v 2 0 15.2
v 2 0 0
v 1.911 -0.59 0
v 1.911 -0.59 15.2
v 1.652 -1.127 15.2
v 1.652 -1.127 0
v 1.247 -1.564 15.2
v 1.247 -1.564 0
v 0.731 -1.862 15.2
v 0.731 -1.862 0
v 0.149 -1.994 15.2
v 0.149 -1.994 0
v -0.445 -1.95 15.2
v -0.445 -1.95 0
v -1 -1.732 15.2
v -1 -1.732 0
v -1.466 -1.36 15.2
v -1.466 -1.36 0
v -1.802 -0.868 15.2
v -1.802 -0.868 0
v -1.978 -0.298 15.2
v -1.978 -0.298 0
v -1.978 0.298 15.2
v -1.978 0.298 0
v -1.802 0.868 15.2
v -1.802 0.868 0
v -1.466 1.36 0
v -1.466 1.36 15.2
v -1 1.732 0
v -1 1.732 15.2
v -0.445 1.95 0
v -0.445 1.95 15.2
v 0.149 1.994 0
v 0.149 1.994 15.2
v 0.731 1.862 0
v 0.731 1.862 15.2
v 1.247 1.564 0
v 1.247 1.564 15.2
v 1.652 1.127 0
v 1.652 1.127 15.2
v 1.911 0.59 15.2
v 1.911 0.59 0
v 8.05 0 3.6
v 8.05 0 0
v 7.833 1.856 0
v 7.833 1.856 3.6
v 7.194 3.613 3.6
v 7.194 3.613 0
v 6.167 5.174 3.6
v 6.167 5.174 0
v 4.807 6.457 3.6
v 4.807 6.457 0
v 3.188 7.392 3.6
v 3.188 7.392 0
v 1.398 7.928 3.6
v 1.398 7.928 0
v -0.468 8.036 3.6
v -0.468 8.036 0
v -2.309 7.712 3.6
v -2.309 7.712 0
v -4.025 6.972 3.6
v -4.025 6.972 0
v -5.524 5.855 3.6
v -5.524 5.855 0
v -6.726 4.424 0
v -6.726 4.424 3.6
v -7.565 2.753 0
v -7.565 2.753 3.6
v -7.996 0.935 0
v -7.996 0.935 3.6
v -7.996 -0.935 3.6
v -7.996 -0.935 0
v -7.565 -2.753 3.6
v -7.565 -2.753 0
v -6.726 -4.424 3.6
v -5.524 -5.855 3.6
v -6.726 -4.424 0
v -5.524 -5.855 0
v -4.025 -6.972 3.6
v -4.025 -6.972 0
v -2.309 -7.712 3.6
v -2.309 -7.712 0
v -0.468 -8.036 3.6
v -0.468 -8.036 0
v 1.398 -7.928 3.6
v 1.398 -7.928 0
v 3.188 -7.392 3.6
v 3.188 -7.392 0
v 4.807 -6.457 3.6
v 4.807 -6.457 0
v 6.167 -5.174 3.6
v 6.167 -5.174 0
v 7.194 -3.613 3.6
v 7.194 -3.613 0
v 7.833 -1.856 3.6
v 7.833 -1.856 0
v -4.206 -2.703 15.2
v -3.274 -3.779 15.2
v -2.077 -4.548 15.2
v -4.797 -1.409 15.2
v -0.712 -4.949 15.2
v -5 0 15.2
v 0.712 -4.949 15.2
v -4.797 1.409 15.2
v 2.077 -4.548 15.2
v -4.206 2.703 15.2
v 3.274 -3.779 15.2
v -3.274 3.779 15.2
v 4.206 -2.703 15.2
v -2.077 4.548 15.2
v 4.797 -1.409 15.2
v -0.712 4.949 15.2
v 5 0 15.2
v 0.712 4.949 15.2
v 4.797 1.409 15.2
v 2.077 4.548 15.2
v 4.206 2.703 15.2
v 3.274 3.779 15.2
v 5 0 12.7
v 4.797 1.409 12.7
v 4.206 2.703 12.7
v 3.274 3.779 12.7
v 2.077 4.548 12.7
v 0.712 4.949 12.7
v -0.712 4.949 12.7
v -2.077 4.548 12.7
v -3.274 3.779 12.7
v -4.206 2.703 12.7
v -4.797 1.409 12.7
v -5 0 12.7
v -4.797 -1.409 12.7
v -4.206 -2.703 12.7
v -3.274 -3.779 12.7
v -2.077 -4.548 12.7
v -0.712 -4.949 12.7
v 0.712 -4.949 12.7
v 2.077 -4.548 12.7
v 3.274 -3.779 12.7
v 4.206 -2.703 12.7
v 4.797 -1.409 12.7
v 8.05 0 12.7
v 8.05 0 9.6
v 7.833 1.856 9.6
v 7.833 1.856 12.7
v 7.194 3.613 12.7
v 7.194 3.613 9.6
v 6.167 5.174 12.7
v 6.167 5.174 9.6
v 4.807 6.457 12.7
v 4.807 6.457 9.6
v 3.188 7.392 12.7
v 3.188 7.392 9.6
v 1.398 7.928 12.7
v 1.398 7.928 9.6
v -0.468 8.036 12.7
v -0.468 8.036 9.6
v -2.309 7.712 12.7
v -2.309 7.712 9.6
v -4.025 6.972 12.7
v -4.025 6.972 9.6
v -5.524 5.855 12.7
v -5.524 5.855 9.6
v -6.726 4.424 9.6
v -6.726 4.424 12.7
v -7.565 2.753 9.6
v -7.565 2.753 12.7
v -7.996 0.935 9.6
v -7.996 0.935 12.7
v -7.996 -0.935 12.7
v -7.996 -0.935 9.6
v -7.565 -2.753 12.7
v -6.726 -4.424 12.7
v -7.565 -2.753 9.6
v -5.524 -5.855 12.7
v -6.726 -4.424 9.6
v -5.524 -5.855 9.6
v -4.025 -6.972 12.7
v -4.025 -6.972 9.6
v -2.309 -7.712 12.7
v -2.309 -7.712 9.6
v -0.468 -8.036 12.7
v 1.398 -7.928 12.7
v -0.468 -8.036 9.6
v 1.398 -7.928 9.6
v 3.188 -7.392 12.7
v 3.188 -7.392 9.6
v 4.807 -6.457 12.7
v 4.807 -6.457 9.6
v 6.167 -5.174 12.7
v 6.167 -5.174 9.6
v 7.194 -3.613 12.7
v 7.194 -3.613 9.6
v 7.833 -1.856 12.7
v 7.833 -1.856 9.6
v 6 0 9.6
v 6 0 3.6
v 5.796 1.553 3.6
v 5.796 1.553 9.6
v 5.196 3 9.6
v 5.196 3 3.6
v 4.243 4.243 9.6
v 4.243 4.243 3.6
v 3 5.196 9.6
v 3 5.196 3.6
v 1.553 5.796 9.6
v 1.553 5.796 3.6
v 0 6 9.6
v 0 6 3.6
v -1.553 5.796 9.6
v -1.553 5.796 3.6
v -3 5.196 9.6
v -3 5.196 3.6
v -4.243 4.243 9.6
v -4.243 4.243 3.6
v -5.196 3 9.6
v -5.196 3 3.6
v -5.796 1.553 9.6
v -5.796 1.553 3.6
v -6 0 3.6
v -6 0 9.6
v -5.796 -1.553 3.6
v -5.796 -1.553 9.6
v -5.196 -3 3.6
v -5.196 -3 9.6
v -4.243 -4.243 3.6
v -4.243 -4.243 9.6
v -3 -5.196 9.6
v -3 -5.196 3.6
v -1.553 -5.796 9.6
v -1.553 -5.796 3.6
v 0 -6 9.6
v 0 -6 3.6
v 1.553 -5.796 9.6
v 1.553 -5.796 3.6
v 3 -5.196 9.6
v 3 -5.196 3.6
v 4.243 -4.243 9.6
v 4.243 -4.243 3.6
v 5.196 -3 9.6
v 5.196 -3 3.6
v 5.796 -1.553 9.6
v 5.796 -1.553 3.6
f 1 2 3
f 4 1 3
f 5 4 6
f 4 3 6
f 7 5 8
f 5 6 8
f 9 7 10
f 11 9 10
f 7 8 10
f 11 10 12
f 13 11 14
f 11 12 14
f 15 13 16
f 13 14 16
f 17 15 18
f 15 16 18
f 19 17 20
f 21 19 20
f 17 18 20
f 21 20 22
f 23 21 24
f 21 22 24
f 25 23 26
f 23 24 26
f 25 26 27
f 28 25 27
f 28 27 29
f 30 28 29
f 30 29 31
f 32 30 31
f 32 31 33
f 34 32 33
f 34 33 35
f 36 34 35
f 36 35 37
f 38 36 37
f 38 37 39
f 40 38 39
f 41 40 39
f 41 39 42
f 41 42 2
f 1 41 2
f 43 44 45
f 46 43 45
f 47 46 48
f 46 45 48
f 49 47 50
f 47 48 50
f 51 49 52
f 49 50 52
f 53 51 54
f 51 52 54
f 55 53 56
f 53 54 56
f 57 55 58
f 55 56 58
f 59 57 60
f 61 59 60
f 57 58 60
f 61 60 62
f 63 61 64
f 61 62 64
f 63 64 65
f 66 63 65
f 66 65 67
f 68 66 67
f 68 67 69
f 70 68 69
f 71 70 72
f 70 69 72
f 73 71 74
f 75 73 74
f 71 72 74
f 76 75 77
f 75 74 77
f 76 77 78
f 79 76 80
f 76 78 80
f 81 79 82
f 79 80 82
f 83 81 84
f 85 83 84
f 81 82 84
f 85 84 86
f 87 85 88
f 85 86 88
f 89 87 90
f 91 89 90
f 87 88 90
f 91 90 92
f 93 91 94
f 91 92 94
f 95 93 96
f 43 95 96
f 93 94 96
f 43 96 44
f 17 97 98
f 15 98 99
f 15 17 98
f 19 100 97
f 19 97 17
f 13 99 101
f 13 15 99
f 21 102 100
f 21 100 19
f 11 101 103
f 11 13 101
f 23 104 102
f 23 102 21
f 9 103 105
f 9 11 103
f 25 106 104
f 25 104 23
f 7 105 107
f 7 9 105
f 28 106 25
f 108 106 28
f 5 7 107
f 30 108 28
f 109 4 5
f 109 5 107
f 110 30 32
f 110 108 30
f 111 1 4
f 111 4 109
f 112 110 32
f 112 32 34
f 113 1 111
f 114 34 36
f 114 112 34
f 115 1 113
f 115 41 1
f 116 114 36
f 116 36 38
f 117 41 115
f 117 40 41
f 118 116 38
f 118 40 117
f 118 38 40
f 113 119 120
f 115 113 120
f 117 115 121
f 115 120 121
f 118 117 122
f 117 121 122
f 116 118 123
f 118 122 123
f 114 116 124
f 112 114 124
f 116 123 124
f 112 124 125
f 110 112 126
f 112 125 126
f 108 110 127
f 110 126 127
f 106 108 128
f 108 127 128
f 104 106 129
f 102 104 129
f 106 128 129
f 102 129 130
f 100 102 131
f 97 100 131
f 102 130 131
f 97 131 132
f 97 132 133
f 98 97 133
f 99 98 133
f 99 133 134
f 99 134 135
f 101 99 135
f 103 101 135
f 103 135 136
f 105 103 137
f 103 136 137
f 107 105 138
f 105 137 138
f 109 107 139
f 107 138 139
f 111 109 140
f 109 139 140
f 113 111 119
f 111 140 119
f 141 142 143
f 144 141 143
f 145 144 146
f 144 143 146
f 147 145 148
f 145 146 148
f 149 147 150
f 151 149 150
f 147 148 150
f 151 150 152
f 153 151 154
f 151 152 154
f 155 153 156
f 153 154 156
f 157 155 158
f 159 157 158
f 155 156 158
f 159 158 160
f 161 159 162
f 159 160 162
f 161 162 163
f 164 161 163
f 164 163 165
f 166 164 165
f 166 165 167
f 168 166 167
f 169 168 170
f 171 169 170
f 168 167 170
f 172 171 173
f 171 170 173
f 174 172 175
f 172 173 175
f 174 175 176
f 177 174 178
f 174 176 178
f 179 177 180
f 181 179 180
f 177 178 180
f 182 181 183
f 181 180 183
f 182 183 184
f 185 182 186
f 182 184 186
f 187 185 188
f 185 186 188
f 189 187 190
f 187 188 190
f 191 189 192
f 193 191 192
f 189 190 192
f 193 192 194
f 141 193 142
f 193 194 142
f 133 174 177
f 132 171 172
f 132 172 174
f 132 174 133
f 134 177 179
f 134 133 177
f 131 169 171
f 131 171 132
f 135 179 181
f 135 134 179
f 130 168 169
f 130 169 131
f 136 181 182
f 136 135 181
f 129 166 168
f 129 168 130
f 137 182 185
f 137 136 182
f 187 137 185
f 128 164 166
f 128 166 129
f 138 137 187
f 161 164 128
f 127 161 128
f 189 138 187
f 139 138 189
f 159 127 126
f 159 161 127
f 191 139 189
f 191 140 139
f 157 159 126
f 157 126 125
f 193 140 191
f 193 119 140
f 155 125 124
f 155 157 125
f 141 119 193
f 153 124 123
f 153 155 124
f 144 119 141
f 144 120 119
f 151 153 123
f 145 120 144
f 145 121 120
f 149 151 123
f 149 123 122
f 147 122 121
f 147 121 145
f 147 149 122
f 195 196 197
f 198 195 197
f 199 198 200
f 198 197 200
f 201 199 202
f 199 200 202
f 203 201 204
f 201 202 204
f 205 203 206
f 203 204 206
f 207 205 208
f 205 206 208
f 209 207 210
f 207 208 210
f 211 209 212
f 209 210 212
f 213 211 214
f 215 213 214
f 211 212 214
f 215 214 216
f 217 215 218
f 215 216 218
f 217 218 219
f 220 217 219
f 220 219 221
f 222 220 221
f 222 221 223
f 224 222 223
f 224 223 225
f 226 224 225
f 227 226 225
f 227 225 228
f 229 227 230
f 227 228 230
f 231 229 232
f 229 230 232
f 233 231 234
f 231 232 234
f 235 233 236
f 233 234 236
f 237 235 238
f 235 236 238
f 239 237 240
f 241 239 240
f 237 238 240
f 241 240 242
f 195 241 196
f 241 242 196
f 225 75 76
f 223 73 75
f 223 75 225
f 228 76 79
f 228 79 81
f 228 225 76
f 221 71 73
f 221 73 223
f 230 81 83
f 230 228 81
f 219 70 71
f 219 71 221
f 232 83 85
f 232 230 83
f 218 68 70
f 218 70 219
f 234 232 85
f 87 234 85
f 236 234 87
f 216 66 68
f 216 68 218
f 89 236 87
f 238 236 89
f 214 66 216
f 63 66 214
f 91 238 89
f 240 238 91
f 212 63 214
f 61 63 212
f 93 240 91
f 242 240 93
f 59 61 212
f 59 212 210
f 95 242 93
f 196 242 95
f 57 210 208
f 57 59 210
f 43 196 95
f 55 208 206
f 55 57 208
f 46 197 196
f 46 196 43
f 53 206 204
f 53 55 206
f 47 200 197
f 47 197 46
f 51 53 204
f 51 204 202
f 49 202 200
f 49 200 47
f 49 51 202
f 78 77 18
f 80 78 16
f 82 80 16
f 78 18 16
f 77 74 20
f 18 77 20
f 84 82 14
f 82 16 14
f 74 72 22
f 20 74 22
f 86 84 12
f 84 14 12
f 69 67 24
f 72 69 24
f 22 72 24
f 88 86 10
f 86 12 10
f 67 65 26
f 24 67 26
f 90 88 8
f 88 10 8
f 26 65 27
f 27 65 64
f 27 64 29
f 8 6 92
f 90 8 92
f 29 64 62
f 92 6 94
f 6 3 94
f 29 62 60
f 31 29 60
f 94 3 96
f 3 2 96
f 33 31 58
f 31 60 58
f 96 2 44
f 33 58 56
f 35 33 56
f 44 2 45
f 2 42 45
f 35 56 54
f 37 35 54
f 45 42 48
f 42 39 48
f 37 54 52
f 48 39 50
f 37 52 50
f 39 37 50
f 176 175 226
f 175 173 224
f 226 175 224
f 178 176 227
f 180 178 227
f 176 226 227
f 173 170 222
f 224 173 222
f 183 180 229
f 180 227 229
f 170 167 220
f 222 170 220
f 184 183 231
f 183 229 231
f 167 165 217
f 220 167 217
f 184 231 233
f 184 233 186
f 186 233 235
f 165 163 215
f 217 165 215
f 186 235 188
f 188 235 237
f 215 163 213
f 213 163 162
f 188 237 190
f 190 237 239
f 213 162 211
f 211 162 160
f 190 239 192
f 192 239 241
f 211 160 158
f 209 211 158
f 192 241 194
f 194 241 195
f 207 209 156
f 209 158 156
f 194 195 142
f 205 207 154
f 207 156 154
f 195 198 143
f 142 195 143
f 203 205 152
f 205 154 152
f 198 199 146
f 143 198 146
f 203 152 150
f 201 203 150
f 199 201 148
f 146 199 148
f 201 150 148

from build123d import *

# Parameters (mm, degrees)
F0_R     = 8.05
F1_DEPTH = 3.6
F2_R     = 6
F3_DEPTH = 6
F4_R     = 8.05
F5_DEPTH = 3.1
F6_R     = 5
F7_DEPTH = 2.5
F8_R     = 2
F9_DEPTH = 15.201


with BuildPart() as f1:
    # F0 (on Top) → F1 (new body)
    with BuildSketch(Plane.XY):
        Circle(F0_R)
    extrude(amount=F1_DEPTH)

    # F2 (on face) → F3 (join)
    with BuildSketch(Plane.XY.offset(3.6)):
        Circle(F2_R)
    extrude(amount=F3_DEPTH)

    # F4 (on face) → F5 (join)
    with BuildSketch(Plane.XY.offset(9.6)):
        Circle(F4_R)
    extrude(amount=F5_DEPTH)

    # F6 (on face) → F7 (join)
    with BuildSketch(Plane.XY.offset(12.7)):
        Circle(F6_R)
    extrude(amount=F7_DEPTH)

    # F8 (on face) → F9 (cut, through all)
    with BuildSketch(Plane(origin=(0, 0, 0), x_dir=(1, 0, 0), z_dir=(0, 0, -1))):
        Circle(F8_R)
    extrude(amount=-F9_DEPTH, mode=Mode.SUBTRACT)


solid = f1.part
